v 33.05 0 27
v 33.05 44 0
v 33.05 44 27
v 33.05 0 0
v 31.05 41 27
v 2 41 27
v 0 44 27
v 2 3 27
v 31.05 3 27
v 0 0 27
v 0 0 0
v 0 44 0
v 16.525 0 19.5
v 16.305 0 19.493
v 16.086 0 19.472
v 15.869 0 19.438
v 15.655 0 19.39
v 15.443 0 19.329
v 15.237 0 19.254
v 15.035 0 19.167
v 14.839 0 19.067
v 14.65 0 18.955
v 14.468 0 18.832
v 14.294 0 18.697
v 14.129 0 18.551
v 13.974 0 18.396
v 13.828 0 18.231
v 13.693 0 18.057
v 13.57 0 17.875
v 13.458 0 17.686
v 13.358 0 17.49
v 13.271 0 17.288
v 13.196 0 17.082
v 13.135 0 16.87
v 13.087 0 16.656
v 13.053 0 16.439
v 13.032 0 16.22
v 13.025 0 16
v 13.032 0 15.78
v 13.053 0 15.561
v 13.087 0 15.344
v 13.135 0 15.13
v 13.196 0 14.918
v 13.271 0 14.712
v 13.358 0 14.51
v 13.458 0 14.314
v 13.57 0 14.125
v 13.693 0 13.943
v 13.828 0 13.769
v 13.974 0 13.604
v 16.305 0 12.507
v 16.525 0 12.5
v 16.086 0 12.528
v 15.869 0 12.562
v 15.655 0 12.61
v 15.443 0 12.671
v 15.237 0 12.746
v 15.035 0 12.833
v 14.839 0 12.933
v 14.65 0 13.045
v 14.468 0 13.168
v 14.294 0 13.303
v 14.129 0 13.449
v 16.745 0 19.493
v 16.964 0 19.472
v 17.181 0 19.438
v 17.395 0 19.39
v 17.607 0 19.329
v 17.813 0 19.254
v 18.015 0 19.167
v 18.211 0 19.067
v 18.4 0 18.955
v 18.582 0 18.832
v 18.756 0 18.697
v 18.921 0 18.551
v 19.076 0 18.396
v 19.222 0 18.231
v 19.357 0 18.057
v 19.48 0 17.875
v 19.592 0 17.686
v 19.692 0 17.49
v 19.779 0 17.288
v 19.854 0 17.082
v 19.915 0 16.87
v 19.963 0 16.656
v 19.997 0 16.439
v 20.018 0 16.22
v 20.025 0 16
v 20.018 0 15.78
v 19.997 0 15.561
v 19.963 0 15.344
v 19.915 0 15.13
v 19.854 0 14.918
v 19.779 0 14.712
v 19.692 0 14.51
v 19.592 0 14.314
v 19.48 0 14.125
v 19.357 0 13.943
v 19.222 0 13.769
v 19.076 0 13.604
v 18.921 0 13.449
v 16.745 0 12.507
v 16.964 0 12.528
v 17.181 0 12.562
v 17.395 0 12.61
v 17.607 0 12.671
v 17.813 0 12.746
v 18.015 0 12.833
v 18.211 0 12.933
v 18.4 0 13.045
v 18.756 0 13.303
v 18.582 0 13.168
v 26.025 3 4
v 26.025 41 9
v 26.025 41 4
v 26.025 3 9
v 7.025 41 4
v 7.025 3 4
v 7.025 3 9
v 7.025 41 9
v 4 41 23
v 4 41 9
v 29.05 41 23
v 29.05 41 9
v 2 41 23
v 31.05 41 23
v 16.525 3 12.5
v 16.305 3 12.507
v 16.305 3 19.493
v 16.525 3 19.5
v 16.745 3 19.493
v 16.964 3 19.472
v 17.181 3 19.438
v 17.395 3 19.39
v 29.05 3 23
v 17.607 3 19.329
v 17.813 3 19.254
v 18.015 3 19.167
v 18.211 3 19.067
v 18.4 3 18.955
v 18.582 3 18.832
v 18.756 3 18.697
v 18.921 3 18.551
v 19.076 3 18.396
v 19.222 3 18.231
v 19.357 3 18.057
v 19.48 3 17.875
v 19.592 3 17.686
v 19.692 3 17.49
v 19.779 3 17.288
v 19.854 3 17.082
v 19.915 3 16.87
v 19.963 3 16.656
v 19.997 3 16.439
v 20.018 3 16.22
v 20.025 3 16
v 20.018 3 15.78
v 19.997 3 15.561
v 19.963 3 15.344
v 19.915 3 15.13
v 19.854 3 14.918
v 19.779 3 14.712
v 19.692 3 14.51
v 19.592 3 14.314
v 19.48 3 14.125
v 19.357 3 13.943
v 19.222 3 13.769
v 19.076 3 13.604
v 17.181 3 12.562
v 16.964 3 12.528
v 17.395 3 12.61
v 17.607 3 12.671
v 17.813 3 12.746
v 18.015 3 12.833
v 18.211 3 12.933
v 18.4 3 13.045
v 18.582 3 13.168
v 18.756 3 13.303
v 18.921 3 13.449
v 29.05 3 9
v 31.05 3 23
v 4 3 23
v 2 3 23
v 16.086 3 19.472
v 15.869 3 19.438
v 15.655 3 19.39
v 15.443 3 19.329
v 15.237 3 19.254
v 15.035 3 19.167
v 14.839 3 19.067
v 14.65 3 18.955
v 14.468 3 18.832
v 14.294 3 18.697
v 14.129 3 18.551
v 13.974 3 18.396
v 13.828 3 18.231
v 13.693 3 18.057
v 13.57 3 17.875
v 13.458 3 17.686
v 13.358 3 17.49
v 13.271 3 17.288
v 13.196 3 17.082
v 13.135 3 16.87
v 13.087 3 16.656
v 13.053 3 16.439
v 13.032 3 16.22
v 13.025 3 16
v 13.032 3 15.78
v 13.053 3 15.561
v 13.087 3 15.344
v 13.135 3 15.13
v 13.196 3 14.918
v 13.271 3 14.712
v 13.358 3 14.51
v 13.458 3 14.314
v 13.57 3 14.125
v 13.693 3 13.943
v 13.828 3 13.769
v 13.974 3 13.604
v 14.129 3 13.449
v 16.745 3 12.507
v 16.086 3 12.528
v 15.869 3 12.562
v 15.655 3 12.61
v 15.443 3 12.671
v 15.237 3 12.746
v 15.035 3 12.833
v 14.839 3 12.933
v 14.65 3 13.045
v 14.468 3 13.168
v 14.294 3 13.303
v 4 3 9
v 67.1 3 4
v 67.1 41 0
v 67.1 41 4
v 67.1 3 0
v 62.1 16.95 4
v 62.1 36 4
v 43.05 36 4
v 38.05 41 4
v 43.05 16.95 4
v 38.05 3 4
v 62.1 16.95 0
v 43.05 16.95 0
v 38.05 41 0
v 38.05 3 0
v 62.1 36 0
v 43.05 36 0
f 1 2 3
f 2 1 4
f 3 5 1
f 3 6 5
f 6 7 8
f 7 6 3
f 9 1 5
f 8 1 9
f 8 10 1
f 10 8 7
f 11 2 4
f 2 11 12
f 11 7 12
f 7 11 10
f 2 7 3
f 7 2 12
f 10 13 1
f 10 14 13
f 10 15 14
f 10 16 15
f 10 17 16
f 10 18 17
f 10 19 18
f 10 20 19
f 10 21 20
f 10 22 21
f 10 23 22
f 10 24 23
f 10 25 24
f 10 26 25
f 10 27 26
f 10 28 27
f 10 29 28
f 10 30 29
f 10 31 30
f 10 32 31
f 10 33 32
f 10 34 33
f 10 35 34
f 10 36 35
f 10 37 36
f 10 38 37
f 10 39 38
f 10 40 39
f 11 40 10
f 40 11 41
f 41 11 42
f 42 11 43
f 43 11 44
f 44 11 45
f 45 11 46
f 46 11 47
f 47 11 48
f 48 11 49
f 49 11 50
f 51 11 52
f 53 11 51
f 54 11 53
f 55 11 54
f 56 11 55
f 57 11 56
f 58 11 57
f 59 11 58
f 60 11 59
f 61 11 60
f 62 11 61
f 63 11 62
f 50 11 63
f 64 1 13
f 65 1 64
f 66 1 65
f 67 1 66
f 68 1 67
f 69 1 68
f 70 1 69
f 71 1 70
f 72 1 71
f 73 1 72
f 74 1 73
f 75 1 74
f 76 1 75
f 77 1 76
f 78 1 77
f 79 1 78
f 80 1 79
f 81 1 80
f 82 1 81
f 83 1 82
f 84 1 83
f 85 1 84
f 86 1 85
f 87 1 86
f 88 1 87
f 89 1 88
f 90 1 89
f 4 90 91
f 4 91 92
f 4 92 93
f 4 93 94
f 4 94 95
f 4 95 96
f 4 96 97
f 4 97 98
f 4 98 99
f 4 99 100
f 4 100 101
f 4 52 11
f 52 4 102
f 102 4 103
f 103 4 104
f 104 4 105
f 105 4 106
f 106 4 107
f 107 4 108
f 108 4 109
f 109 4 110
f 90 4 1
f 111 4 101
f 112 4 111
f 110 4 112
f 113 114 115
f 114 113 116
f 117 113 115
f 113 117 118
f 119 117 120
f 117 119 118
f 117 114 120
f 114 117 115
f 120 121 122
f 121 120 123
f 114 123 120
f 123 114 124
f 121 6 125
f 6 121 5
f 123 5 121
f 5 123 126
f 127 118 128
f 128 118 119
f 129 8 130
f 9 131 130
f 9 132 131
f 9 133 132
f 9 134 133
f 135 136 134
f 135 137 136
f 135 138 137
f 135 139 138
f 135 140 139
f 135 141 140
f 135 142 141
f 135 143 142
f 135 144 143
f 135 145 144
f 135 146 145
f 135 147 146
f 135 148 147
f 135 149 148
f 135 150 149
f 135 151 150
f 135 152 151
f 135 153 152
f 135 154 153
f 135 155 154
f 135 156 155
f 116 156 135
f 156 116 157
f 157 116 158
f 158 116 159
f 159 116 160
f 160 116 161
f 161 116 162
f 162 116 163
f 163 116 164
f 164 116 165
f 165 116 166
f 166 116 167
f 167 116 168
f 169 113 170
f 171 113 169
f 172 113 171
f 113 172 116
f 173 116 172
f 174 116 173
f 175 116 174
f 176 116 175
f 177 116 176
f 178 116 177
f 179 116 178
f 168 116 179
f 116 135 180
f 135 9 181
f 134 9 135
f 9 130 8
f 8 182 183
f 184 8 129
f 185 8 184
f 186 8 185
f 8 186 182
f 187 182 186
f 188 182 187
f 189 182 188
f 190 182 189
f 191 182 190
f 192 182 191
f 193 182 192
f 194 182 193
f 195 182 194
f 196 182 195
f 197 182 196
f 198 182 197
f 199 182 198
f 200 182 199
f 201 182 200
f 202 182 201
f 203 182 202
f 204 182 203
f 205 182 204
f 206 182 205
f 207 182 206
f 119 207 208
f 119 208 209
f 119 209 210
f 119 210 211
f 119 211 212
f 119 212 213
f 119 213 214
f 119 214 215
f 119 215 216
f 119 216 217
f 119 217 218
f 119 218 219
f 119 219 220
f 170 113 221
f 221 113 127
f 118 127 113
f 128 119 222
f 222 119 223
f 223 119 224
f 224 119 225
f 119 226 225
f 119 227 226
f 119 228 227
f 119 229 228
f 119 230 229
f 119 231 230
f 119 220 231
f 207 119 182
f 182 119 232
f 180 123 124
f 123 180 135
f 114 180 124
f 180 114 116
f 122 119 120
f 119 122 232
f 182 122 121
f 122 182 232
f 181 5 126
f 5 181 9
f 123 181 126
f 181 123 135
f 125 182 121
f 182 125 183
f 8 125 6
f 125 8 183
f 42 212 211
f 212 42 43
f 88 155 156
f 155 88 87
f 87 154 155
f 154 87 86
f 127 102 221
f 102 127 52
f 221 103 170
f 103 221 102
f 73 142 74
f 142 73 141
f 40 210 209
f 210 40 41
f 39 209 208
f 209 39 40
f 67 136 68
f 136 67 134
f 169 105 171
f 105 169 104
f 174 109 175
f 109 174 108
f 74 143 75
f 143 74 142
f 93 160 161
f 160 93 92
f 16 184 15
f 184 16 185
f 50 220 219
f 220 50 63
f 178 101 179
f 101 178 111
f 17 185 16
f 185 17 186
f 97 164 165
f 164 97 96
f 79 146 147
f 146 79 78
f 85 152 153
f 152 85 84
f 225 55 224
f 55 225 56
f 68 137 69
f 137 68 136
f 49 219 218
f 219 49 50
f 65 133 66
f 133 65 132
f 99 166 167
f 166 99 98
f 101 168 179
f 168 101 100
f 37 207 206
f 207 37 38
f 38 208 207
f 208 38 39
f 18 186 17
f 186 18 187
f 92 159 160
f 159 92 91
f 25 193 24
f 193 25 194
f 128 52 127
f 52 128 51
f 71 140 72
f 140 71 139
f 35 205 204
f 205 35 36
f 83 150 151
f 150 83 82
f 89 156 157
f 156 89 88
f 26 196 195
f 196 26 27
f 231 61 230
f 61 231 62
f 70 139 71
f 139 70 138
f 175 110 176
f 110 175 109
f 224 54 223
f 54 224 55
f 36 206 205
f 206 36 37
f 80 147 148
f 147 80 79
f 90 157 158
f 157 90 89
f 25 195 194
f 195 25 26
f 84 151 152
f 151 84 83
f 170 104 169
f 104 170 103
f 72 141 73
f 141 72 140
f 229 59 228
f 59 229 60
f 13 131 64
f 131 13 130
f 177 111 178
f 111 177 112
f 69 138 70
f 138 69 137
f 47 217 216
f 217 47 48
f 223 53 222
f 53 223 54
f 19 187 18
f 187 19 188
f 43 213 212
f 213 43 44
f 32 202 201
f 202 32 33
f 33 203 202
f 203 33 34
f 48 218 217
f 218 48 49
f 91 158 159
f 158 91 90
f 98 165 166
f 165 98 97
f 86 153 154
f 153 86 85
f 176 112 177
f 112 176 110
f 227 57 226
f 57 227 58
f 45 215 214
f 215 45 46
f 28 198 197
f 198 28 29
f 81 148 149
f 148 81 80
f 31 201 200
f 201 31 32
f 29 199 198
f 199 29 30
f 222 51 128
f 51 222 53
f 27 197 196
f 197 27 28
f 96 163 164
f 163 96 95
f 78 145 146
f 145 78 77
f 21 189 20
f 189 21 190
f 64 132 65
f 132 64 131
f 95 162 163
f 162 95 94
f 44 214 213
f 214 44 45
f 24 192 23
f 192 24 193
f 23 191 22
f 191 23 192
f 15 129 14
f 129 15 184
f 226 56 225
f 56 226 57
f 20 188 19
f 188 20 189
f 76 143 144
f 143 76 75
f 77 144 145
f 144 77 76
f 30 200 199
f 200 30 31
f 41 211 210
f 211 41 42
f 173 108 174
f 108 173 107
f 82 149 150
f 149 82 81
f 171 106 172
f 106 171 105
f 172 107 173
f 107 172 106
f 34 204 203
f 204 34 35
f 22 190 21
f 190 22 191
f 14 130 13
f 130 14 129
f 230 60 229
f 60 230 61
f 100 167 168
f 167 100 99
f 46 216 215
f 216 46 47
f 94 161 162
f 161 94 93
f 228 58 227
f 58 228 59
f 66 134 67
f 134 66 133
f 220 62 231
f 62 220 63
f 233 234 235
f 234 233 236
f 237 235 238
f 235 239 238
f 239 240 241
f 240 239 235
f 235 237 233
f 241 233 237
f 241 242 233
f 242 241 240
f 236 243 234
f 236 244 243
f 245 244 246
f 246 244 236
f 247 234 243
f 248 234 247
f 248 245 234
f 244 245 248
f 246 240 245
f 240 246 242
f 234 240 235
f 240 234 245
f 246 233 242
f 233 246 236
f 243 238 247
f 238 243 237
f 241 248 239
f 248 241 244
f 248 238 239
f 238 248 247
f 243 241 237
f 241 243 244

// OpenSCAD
$fn = 100;

wiggle = 0.5;
boardW = 18+wiggle*2;
boardH = 37+wiggle*2;
boardD = 5;


topBottom = 4;
frontBack = 3;
sides = 4;
slat = 2;
pad = 0.1;

cherryHole = 19.05;
cherryD = 10 + 8 - topBottom;
cherryPad = 3;
cavityW = cherryHole + cherryPad*2;

jackBump = topBottom+boardD+cherryD/2;

height = topBottom*2+boardD+cherryD;
caseW = cavityW+sides*2;

difference() {
  cube([caseW,boardH+frontBack*2,height]);
  // interior
  translate([(caseW-boardW)/2,frontBack,topBottom])
    cube([boardW,boardH,height-topBottom/2]);
  // interior 2
  translate([sides,frontBack,topBottom+boardD])
    cube([cavityW,boardH,height-topBottom/2-boardD]);
  // top holder slats
  translate([sides-slat,frontBack,height-topBottom])
    cube([cavityW+slat*2,boardH,topBottom+pad]);
  // jack hole
  translate([caseW/2, topBottom+pad, jackBump])
    rotate([90,0,0]) cylinder(h=topBottom+pad*2,r=3.5);
}

topWidth = cavityW+slat*2;
translate([caseW+5,frontBack,0])
difference() {
  cube([topWidth,boardH,topBottom]);
  translate([(topWidth-cherryHole)/2,boardH-cherryPad-slat-cherryHole,-pad])
    cube([cherryHole,cherryHole,topBottom+pad*2]);
}

echo(caseW,boardH+frontBack*2,height);
